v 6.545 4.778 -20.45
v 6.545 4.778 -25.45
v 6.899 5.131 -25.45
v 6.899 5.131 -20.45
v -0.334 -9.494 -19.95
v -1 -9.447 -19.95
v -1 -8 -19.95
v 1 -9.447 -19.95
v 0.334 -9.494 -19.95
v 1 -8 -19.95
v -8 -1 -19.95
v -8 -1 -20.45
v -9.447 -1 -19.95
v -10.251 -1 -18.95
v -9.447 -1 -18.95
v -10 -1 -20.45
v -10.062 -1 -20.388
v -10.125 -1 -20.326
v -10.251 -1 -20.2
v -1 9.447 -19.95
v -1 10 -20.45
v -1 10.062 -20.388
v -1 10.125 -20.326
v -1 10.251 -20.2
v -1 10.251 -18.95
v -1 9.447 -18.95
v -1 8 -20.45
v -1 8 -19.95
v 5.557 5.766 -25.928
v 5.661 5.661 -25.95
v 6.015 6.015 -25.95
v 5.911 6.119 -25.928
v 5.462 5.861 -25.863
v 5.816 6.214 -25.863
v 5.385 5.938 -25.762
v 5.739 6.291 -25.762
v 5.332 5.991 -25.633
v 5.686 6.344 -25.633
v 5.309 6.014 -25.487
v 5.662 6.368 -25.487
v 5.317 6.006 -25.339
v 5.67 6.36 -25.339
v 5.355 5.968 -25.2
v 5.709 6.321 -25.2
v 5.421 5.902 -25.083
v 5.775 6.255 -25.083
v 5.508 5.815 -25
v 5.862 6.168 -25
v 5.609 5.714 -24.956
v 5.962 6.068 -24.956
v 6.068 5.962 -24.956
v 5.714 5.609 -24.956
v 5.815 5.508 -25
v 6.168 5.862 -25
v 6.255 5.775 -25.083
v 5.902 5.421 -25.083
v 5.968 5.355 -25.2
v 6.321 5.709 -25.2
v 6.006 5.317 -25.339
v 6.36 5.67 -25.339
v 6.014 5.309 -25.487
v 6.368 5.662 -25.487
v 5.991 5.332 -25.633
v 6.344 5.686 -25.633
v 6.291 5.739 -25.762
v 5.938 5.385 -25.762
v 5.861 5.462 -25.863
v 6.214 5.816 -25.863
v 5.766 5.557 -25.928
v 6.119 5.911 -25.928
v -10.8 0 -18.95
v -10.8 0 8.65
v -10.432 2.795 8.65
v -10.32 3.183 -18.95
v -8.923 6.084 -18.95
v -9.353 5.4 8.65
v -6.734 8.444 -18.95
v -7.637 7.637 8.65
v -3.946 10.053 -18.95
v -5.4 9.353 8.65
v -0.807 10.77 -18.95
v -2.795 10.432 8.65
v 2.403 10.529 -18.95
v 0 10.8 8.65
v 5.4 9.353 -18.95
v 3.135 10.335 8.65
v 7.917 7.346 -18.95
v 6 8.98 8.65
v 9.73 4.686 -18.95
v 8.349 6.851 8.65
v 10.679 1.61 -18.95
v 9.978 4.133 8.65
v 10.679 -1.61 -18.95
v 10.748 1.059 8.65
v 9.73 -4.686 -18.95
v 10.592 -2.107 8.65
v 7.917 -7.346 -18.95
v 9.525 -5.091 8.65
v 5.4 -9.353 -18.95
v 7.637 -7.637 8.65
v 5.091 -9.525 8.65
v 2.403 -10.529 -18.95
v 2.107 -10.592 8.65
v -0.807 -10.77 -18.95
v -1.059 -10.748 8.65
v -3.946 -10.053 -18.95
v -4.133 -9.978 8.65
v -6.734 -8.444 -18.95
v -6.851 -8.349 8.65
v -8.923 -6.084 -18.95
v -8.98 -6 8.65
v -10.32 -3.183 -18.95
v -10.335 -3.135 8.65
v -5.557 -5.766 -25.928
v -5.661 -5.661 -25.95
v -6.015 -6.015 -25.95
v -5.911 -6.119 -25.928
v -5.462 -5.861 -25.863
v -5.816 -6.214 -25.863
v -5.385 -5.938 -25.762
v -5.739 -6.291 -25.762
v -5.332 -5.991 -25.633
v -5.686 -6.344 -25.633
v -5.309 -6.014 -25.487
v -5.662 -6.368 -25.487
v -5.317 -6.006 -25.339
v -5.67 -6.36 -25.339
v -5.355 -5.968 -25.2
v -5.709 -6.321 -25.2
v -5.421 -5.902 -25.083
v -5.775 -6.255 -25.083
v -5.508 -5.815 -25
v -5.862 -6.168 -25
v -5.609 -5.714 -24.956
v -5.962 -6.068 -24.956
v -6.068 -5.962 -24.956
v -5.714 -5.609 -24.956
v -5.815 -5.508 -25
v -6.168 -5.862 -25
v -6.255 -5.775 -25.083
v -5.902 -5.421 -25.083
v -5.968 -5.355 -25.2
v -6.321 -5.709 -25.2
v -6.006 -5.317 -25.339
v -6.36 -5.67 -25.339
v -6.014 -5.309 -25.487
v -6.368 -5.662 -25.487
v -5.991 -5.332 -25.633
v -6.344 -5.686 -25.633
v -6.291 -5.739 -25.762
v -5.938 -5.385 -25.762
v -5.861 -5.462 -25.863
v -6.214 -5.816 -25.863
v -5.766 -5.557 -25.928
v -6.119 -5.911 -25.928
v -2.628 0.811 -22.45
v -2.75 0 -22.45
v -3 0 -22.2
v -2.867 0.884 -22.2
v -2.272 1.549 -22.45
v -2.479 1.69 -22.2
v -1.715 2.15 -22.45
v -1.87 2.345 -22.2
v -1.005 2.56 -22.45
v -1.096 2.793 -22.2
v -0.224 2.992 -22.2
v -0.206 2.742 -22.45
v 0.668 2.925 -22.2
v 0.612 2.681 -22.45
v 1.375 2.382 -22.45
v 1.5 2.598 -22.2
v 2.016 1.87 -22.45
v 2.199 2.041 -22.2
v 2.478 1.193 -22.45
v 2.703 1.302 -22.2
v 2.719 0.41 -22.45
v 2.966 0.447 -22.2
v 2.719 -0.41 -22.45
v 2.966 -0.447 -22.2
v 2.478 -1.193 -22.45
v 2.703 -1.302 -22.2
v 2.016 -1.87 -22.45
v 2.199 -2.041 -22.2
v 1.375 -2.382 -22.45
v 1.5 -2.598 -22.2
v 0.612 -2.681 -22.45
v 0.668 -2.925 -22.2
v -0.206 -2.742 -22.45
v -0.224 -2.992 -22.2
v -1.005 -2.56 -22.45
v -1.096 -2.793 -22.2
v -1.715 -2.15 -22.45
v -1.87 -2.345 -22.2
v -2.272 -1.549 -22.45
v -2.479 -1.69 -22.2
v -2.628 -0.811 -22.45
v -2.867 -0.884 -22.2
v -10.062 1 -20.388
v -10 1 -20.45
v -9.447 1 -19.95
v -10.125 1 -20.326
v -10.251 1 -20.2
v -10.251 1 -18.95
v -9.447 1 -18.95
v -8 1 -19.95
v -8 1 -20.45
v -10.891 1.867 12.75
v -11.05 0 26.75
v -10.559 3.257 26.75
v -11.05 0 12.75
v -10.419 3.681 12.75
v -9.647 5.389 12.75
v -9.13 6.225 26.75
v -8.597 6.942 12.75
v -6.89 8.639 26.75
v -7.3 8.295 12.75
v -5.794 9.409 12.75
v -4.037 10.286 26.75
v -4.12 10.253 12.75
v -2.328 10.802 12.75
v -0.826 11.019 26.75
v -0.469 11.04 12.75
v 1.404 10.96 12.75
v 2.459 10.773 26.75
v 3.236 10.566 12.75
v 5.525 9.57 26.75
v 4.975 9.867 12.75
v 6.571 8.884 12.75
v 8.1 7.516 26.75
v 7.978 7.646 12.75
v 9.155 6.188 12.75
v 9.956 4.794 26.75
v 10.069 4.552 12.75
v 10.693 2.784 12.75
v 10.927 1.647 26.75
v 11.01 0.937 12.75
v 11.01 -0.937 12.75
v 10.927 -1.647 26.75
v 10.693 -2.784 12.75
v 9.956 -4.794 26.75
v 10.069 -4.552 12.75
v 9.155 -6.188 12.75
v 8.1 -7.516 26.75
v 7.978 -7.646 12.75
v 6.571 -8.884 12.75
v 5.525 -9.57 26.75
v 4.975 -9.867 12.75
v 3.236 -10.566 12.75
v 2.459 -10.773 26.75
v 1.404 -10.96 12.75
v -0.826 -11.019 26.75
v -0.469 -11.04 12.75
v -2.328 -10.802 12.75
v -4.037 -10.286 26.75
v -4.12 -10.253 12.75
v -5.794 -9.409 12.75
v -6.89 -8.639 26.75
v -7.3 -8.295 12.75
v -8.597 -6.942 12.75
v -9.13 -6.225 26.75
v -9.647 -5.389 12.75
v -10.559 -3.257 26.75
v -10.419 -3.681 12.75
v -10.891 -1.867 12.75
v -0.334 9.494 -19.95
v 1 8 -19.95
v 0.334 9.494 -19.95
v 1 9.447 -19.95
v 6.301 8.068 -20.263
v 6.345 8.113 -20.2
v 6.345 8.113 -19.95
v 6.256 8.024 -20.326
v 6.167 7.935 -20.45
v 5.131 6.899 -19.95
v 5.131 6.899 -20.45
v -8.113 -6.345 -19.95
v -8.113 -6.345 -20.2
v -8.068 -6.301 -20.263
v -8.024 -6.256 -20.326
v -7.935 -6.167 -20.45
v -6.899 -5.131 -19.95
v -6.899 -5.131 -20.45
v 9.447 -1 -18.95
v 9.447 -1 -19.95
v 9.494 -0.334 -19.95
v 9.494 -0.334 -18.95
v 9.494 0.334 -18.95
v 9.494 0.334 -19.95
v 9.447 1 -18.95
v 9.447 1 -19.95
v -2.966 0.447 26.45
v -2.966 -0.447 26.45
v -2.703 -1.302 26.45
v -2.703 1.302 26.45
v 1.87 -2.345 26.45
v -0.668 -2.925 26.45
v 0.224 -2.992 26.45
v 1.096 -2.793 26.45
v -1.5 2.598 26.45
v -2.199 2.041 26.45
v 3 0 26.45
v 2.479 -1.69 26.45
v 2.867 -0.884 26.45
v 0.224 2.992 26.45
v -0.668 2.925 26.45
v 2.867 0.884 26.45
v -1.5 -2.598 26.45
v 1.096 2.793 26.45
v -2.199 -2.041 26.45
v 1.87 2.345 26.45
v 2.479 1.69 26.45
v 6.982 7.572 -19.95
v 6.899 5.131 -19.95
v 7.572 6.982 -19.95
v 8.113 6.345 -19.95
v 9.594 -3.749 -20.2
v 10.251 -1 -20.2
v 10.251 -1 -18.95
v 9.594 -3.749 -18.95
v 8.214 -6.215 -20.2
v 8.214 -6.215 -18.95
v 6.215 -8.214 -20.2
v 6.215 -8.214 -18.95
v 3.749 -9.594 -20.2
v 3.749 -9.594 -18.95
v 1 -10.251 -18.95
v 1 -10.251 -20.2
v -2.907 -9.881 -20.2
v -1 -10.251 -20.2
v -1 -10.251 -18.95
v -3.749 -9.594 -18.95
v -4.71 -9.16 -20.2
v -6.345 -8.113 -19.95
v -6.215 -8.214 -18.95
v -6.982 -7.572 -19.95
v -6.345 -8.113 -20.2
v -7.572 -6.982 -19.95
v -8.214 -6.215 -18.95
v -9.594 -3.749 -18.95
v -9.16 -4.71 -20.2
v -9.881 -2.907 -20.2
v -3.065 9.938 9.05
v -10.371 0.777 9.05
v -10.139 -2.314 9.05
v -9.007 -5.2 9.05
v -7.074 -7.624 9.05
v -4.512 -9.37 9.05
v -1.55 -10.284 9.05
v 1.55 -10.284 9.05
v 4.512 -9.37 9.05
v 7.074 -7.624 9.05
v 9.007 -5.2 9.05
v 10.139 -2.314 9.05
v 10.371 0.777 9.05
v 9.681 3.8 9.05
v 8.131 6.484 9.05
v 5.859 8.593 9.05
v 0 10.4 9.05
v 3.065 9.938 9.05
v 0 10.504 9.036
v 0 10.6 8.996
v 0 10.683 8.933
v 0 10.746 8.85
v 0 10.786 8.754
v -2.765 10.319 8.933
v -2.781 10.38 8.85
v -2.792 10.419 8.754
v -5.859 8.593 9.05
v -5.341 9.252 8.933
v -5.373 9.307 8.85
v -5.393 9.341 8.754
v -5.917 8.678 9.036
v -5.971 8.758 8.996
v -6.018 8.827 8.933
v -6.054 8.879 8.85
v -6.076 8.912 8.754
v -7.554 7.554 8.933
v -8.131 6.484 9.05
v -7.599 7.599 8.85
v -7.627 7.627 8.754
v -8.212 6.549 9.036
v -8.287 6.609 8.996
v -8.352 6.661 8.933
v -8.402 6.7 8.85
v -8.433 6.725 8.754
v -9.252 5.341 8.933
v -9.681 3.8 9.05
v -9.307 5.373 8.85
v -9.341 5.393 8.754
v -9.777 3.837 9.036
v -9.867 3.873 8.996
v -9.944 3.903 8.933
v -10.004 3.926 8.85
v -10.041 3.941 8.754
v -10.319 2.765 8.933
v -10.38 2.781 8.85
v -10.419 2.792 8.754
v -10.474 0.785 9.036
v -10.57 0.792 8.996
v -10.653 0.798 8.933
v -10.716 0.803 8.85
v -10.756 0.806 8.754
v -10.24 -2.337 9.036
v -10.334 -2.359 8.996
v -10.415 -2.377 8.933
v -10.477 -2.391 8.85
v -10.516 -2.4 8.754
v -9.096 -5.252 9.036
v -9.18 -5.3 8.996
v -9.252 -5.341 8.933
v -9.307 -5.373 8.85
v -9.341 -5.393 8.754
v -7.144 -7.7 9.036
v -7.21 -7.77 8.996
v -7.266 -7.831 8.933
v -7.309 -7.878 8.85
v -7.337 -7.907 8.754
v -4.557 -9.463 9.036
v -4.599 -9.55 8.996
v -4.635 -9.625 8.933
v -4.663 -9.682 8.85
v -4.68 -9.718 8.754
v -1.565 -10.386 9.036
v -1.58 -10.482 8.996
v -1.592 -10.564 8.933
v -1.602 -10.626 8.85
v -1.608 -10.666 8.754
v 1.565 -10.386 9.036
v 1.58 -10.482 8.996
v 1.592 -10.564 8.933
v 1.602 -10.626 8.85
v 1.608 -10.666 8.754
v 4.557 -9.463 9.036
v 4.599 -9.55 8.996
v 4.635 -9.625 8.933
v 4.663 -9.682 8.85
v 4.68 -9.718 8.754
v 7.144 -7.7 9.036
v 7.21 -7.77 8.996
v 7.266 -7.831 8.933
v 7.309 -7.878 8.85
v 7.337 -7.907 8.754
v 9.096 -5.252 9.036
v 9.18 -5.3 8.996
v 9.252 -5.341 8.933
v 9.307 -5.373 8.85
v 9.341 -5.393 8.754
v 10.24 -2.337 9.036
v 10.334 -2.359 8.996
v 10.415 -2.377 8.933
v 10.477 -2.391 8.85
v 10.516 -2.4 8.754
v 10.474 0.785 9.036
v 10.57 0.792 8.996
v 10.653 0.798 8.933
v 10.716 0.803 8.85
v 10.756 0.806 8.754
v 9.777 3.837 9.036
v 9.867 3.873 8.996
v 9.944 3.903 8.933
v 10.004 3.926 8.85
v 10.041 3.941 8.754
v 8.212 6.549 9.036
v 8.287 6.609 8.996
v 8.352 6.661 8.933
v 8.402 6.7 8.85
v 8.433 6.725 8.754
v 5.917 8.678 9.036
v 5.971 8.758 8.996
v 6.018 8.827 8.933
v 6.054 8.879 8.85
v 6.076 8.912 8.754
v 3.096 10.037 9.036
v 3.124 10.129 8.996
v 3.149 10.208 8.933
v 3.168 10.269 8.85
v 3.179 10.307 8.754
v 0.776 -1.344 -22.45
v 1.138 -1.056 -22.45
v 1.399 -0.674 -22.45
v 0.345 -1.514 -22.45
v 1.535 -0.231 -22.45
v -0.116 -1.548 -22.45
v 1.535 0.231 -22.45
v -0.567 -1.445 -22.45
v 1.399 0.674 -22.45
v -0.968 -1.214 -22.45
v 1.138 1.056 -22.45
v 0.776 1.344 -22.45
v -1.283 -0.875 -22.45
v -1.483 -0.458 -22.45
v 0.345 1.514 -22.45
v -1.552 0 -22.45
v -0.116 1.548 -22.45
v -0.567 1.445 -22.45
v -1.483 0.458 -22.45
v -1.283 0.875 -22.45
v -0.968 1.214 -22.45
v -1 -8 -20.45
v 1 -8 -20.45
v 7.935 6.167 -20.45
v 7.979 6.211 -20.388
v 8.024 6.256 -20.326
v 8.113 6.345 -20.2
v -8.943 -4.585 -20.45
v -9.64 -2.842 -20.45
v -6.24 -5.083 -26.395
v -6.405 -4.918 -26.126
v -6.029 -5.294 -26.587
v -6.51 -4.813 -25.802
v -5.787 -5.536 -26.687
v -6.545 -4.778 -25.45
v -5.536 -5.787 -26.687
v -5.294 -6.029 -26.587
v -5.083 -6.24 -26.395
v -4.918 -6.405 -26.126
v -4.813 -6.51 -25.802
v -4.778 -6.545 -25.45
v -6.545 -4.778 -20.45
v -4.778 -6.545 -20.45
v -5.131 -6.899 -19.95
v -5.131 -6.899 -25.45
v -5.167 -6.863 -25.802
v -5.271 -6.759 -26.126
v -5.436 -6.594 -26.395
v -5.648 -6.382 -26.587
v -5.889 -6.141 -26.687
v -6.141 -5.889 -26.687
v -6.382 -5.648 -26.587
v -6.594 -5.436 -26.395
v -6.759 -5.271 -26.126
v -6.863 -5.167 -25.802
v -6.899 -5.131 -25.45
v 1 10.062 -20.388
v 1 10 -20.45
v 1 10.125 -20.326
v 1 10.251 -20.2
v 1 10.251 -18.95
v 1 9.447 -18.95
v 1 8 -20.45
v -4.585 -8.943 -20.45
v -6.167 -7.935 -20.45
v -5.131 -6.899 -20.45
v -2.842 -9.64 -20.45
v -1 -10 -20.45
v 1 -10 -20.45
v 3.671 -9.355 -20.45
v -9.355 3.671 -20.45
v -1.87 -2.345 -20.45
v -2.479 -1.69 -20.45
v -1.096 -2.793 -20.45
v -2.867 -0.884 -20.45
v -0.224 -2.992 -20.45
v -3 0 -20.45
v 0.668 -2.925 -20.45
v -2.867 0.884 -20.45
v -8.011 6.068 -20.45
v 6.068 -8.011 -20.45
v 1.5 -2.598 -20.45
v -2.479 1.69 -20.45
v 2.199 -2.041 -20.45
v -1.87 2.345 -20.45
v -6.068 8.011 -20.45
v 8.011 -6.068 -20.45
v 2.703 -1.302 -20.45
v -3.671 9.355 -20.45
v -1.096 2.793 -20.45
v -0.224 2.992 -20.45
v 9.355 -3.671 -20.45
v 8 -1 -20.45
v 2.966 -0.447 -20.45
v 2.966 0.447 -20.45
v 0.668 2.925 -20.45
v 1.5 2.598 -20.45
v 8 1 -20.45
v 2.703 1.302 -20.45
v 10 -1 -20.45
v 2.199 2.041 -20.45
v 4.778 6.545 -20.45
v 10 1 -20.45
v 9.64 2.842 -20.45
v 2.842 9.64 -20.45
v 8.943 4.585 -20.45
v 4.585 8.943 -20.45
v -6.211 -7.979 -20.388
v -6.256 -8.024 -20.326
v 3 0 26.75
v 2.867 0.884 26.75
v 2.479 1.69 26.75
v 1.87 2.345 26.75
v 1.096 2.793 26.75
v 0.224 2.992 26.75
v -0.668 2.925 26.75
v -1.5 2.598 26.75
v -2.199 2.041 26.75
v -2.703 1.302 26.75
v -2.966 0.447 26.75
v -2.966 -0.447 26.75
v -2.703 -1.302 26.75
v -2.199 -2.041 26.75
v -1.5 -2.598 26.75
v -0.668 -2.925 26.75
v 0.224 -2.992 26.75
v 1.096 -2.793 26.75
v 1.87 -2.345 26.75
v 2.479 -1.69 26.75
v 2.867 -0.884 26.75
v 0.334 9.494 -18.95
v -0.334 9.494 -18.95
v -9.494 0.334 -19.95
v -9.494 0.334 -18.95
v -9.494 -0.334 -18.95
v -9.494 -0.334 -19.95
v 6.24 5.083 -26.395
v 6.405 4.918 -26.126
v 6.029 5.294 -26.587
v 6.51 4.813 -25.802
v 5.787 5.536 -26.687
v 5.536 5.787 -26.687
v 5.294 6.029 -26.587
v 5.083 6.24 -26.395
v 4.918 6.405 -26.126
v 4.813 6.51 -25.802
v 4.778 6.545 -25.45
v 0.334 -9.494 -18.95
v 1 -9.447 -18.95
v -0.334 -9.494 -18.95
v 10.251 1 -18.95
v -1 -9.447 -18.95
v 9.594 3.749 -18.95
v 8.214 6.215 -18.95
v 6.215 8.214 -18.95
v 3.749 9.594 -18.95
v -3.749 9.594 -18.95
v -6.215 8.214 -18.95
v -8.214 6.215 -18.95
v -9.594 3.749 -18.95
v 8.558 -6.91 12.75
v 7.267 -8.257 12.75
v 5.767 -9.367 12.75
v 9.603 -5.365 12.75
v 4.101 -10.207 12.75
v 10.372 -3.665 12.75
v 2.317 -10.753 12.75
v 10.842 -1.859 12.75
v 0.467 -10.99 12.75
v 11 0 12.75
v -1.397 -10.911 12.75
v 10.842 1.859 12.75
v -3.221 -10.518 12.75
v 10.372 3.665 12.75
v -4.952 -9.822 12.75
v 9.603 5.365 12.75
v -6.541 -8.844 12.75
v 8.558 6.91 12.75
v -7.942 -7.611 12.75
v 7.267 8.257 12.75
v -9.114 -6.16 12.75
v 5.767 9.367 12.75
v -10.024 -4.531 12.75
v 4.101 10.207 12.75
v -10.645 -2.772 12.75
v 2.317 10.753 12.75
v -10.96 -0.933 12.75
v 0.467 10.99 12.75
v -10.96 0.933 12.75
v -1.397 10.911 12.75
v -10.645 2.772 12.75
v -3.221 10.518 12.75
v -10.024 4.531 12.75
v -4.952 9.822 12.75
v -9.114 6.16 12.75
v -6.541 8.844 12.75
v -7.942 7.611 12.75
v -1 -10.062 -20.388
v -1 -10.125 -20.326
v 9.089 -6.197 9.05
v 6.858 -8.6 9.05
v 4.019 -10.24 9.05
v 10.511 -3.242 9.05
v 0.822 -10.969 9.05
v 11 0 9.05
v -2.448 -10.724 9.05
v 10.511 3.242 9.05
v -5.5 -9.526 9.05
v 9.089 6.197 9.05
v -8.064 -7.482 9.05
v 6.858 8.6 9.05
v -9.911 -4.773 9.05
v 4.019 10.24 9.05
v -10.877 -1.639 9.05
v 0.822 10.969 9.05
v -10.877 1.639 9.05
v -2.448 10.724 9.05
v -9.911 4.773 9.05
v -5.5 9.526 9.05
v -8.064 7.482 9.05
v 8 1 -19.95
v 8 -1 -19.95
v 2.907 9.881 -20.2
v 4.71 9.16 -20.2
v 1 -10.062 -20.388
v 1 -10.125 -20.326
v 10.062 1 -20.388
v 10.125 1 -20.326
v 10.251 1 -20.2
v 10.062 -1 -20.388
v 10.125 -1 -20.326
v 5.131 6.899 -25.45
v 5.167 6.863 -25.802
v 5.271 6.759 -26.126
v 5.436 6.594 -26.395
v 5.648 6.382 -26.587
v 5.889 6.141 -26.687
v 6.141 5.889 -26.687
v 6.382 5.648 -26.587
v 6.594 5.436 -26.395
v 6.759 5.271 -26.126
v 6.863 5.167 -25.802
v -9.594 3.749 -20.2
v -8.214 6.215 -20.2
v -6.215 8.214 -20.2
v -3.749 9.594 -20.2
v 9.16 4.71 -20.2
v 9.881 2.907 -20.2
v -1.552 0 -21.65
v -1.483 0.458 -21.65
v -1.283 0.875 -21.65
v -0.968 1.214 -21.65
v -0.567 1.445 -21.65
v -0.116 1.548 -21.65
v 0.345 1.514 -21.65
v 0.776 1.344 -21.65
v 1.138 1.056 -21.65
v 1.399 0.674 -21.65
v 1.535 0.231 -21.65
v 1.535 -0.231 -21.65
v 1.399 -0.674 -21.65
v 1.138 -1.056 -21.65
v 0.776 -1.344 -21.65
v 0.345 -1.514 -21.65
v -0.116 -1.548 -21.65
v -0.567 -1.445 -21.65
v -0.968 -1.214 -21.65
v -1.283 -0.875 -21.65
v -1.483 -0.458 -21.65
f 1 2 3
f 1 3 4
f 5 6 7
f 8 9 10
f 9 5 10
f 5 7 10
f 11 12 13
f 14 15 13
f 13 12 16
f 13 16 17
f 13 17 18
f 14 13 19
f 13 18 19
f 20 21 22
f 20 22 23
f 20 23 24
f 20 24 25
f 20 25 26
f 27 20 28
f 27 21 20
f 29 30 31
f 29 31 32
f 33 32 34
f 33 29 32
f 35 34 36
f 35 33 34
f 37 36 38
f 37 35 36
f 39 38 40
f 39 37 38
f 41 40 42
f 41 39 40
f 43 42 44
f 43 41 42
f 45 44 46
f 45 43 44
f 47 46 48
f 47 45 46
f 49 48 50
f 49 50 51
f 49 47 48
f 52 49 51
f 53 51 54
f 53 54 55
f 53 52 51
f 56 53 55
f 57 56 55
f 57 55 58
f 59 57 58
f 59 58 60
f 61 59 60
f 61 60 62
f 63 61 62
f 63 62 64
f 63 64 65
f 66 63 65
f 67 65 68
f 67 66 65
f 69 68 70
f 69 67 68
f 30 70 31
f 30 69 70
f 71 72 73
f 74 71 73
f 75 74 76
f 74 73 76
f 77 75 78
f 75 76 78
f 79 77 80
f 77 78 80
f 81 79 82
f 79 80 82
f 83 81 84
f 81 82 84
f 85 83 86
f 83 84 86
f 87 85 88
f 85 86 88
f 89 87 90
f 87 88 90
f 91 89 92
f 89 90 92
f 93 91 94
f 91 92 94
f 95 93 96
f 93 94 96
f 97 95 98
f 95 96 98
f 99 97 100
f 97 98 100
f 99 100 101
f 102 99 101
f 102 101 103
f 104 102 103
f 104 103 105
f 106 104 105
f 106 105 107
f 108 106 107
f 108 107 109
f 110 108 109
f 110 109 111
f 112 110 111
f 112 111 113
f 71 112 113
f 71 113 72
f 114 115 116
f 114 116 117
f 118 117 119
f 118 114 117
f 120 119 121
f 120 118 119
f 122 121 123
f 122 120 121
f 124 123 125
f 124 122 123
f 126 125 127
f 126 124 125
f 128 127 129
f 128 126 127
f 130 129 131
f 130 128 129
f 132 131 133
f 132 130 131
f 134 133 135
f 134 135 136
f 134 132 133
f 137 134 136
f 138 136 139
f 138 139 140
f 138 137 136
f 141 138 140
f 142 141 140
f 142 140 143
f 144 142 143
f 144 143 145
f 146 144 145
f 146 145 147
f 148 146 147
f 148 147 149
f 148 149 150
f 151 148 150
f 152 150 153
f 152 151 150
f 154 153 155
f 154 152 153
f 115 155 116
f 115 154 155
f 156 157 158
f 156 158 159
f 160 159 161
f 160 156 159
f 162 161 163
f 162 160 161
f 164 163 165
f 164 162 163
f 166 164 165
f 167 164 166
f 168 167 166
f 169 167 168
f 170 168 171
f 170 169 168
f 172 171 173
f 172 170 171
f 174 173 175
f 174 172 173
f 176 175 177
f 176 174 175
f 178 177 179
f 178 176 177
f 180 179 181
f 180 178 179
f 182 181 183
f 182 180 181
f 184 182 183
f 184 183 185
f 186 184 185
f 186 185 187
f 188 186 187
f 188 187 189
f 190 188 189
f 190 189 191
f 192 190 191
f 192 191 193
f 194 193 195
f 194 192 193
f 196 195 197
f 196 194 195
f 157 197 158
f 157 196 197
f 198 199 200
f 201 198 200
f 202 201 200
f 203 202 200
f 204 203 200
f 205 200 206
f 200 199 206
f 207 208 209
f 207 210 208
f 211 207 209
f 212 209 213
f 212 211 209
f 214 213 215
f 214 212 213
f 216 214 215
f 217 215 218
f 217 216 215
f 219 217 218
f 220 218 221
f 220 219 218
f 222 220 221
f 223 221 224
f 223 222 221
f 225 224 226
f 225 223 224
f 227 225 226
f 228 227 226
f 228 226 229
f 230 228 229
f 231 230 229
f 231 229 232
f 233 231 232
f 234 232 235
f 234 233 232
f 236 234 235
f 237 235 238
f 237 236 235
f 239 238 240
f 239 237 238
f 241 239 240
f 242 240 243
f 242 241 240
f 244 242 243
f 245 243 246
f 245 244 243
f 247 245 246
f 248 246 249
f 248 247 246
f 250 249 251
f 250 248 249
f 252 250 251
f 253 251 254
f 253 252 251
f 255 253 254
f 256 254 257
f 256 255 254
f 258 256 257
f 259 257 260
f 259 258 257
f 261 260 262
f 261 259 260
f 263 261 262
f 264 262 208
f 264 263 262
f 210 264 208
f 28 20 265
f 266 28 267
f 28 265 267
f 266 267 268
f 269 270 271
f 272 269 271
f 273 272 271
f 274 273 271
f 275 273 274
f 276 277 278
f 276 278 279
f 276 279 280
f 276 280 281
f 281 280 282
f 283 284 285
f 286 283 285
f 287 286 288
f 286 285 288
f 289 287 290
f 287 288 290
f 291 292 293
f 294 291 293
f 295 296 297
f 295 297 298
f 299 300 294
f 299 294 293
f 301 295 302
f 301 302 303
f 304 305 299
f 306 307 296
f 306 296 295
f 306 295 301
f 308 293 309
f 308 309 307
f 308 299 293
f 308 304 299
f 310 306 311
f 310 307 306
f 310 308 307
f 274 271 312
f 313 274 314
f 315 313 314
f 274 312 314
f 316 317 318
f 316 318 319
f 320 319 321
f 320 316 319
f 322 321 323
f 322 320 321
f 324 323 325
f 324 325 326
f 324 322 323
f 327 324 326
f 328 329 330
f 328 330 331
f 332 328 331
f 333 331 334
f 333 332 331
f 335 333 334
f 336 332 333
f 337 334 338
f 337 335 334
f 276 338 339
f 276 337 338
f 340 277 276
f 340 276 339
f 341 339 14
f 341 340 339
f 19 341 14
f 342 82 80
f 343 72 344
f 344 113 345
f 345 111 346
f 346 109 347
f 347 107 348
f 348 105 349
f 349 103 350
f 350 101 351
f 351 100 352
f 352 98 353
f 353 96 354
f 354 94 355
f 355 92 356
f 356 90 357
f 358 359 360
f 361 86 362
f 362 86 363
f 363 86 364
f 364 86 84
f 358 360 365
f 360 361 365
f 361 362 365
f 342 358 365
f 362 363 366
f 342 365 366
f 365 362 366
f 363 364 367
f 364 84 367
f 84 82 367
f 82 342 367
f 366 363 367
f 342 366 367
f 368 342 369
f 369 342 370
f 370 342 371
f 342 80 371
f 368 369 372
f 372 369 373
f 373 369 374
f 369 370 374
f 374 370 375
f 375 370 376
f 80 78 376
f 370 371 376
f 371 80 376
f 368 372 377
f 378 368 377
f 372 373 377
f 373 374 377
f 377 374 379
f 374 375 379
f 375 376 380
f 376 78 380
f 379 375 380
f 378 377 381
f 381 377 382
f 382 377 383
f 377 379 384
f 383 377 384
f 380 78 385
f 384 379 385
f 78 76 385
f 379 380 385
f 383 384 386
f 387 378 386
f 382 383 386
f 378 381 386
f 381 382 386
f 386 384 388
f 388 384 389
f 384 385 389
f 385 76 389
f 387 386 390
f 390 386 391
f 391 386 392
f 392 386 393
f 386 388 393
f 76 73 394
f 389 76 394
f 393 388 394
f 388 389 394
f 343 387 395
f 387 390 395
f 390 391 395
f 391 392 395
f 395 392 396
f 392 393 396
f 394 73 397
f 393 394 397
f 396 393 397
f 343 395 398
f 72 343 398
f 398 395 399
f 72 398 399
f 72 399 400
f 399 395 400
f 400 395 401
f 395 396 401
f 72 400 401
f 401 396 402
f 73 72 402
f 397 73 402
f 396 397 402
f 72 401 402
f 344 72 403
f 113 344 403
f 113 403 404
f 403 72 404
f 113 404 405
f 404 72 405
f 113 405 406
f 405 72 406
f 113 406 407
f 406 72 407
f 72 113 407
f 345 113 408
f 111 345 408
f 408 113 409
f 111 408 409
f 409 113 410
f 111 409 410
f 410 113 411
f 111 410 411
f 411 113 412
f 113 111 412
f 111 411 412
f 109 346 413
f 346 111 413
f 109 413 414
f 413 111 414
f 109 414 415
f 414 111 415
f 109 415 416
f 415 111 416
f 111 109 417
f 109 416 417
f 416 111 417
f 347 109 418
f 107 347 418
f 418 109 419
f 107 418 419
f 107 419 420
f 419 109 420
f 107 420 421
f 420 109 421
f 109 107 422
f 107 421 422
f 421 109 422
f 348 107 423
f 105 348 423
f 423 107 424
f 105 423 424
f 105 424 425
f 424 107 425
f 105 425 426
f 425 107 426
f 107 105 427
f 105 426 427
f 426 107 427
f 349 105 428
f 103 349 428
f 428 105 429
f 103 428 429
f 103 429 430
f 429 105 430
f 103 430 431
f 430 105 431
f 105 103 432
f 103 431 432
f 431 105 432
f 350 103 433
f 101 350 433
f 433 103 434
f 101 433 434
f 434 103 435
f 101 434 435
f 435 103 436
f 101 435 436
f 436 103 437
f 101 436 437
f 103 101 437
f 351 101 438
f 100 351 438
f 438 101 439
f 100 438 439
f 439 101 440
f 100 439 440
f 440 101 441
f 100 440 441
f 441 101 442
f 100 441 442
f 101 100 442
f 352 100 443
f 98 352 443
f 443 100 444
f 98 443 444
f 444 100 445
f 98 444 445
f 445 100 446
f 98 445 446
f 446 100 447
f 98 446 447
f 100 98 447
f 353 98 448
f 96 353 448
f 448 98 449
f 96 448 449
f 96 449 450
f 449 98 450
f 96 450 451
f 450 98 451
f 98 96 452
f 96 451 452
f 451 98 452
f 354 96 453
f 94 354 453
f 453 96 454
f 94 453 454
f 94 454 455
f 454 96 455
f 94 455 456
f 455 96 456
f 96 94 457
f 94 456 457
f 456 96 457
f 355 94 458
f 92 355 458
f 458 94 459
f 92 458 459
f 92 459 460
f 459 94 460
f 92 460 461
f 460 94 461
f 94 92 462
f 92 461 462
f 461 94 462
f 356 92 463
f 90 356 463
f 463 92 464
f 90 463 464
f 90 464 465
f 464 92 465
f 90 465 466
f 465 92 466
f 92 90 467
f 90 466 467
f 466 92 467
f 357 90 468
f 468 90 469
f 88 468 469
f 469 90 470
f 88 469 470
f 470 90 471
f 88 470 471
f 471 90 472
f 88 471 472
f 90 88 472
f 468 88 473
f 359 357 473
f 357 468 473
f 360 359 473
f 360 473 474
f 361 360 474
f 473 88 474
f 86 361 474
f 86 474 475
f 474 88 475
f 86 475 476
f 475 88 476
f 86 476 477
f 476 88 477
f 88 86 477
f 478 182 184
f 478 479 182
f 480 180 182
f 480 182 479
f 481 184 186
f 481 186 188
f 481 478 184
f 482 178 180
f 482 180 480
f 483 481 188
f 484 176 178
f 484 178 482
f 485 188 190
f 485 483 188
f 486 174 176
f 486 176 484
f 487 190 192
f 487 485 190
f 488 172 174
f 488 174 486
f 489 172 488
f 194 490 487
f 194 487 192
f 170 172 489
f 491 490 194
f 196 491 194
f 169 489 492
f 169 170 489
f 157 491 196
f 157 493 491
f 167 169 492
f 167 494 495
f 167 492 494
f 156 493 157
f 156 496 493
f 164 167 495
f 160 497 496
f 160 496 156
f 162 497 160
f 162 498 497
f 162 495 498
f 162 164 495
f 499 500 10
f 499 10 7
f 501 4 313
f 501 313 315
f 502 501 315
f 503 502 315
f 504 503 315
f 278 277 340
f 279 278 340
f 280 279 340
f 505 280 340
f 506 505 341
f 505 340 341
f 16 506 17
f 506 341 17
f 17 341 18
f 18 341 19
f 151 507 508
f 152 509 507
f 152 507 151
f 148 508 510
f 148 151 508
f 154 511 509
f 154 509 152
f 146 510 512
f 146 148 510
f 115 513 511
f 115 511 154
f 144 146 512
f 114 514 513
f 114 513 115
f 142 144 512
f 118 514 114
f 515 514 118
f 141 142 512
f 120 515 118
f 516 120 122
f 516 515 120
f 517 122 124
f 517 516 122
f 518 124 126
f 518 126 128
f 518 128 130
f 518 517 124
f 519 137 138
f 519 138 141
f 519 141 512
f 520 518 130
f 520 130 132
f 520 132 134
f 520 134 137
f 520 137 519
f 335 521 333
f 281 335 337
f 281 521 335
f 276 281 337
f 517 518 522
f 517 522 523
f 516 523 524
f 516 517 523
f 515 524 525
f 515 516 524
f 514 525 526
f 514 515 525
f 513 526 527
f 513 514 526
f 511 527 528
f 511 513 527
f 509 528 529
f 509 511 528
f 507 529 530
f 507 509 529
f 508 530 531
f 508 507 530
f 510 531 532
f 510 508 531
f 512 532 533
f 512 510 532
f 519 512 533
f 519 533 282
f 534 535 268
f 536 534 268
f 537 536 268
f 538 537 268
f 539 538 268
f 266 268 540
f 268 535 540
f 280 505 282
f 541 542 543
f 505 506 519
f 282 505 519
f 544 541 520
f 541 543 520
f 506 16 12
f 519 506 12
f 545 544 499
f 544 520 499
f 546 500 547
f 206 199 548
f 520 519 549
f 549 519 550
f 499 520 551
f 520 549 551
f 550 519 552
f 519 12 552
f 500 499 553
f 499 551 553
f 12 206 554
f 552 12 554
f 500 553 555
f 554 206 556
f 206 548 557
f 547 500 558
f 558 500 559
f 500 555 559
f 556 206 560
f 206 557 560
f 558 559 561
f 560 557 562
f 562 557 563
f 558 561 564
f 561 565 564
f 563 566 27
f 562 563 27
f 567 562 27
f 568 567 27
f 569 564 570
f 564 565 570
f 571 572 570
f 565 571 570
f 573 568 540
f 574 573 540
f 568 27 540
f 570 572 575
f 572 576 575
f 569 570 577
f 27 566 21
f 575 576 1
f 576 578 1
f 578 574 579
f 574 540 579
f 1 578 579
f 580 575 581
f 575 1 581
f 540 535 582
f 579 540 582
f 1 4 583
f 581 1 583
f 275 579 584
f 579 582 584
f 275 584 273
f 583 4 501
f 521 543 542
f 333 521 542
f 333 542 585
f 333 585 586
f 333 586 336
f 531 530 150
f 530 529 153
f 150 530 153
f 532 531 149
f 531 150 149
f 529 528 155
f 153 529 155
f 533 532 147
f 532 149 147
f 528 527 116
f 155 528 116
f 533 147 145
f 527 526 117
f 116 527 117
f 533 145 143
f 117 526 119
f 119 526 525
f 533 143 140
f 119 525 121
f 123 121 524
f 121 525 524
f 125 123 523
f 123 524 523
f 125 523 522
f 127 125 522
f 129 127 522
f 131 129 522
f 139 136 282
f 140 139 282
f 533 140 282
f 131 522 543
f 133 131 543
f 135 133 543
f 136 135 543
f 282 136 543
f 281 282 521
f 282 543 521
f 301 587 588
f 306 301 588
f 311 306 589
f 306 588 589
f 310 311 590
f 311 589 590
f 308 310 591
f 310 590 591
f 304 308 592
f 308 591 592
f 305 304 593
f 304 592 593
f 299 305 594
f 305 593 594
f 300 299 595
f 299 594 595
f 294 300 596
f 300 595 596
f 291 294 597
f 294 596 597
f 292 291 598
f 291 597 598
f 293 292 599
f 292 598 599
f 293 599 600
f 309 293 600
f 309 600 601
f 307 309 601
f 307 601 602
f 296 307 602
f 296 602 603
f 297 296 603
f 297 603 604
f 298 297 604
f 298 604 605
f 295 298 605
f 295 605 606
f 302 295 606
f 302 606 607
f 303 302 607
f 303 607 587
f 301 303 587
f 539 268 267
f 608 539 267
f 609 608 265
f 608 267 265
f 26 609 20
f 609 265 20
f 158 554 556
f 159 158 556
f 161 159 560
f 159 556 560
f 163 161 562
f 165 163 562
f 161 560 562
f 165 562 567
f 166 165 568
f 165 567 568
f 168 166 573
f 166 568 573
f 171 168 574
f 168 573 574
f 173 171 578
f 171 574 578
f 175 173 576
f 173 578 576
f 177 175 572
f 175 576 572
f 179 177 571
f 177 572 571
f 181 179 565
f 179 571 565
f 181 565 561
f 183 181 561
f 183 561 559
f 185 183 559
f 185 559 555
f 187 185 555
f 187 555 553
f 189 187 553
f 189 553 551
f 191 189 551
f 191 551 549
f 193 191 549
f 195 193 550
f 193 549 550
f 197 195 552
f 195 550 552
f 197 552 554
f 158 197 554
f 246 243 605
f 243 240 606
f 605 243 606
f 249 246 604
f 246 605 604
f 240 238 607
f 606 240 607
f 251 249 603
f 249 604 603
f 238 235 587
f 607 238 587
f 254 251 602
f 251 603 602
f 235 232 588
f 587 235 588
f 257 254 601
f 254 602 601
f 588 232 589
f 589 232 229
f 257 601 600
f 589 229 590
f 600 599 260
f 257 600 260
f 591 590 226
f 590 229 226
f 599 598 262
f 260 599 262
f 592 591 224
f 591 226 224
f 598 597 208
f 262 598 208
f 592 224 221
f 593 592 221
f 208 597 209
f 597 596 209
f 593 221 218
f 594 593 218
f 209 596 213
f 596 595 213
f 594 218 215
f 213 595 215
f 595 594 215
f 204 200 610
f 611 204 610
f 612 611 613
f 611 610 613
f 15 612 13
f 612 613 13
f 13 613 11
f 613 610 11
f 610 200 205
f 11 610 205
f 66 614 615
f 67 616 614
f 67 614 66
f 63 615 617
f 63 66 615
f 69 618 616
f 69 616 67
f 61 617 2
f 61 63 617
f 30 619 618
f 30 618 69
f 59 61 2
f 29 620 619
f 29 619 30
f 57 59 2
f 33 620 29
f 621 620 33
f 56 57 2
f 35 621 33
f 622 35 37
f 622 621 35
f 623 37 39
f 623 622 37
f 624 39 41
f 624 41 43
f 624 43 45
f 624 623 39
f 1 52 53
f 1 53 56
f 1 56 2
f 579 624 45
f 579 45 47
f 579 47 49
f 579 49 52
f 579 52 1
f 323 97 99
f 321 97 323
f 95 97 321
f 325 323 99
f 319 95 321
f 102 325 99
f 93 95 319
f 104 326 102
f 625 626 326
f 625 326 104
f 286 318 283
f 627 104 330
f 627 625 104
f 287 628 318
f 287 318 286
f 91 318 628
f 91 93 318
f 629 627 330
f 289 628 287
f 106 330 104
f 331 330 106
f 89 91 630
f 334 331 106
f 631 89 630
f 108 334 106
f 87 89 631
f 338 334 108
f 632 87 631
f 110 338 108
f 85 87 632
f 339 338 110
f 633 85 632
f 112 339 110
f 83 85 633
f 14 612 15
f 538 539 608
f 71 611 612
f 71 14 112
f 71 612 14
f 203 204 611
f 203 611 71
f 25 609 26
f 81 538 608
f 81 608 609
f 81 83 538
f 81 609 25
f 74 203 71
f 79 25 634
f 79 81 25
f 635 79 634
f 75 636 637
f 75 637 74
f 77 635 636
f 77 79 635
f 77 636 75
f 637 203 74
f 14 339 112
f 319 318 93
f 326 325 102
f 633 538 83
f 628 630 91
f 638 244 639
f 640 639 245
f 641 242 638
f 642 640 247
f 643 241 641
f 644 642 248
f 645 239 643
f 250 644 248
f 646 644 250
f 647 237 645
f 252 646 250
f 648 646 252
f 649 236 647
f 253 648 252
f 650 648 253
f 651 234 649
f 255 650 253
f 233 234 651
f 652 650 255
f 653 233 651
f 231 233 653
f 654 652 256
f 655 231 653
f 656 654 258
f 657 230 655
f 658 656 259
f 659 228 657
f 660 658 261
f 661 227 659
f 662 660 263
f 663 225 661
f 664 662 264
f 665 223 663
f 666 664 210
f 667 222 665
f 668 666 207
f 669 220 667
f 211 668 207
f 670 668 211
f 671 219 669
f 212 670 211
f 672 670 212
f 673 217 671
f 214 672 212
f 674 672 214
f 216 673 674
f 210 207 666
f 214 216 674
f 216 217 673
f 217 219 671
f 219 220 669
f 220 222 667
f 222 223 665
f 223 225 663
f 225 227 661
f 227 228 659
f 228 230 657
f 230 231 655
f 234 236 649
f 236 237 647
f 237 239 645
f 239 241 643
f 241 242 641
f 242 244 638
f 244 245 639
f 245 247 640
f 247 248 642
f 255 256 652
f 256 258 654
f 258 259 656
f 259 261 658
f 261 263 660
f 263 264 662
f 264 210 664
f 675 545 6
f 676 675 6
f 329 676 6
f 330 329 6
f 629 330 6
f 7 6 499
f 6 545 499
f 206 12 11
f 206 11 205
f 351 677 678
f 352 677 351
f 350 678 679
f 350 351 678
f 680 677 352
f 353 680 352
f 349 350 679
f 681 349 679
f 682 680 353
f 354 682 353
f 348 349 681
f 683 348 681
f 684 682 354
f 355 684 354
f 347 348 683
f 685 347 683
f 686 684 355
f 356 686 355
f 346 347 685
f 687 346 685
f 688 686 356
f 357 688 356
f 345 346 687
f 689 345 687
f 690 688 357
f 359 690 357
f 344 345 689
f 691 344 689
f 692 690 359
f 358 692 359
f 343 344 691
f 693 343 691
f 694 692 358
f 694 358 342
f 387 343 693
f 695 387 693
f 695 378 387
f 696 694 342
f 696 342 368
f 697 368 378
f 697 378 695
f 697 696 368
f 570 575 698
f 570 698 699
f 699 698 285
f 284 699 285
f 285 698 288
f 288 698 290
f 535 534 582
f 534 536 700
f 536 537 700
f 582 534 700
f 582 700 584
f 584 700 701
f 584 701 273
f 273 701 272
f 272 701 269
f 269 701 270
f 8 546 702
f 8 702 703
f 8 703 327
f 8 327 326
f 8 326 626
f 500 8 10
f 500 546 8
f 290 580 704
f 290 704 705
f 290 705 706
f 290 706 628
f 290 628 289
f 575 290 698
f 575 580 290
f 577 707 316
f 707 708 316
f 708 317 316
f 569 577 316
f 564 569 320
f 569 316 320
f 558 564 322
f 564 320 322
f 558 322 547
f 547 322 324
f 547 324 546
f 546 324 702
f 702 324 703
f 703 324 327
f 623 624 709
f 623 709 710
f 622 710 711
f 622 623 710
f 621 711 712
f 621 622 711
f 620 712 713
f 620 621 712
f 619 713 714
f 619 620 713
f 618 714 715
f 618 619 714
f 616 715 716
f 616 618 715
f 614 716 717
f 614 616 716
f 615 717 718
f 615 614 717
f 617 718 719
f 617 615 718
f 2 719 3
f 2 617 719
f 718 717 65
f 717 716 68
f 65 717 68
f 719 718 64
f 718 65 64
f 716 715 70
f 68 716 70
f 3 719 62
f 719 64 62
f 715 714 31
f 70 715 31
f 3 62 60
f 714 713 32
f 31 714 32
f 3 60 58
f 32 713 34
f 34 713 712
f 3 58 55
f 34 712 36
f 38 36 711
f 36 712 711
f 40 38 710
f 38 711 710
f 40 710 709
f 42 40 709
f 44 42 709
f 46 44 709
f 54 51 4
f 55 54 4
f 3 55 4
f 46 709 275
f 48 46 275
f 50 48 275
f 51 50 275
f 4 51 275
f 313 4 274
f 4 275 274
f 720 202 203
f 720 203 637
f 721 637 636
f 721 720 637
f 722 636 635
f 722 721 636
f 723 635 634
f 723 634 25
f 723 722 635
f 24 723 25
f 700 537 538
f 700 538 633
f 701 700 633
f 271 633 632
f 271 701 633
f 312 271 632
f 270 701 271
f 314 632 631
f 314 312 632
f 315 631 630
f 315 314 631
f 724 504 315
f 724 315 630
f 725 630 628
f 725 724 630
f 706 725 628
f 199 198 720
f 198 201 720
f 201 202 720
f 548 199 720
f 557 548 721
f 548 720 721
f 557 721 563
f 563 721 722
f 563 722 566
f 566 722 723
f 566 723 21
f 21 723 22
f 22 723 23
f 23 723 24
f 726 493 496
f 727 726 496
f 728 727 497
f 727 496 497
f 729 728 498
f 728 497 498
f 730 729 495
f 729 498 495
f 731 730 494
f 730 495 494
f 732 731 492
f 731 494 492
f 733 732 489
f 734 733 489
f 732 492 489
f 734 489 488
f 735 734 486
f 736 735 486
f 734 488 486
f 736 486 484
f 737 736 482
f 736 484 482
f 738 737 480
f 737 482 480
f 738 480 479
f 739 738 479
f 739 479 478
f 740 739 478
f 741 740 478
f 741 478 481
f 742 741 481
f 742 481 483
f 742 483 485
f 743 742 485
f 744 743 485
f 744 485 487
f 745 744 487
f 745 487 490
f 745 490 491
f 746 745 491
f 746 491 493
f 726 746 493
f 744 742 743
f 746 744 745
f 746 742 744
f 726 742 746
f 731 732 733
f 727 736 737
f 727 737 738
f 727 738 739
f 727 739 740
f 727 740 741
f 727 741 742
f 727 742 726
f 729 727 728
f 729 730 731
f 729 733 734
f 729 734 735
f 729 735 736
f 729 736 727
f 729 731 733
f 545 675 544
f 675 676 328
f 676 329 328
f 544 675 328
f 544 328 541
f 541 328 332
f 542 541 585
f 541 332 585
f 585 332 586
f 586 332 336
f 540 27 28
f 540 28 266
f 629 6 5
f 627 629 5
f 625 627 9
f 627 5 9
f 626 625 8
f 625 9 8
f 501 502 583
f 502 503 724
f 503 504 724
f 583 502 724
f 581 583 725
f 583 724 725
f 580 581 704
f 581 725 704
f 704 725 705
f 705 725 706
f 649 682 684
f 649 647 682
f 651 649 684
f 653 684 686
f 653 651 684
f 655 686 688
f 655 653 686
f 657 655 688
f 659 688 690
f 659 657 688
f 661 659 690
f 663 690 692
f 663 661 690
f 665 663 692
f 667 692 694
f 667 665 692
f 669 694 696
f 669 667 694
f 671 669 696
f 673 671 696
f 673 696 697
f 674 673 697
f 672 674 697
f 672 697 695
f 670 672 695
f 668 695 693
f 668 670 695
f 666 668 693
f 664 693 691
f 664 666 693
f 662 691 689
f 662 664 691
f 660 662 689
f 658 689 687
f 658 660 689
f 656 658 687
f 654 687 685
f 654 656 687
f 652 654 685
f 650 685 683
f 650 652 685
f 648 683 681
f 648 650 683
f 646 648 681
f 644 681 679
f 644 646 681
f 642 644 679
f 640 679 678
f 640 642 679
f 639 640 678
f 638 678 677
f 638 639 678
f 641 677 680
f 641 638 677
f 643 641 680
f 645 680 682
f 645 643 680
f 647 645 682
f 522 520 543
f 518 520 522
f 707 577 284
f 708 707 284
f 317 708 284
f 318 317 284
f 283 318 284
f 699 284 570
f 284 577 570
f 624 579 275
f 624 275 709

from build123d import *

# Parameters (mm, degrees)
SKETCH1_R           = 11
BOSS_EXTRUDE1_DEPTH = 20.45
SKETCH2_R           = 11
SKETCH2_R_2         = 10.8
CUT_EXTRUDE1_DEPTH  = 30.5
SKETCH5_R           = 0.8
CUT_EXTRUDE2_DEPTH  = 3
BOSS_EXTRUDE2_DEPTH = 2
SKETCH7_R           = 3
BOSS_EXTRUDE3_DEPTH = 12
CUT_EXTRUDE3_DEPTH  = 1
CIRPATTERN1_COUNT   = 4
CIRPATTERN2_COUNT   = 4
SKETCH11_R          = 5
BOSS_EXTRUDE4_DEPTH = 0.25
SKETCH12_R          = 11.05
BOSS_EXTRUDE5_DEPTH = 7
SKETCH14_R          = 1.0375
CUT_EXTRUDE4_DEPTH  = 3
SKETCH16_R          = 10.8
SKETCH16_R_2        = 10.3
CUT_EXTRUDE5_DEPTH  = 1.5
CUT_EXTRUDE6_DEPTH  = 0.5
CUT_EXTRUDE7_DEPTH  = 1.5
CHAMFER1_SIZE       = 0.25
CUT_EXTRUDE8_DEPTH  = 0.5
SKETCH20_R          = 0.5
BOSS_EXTRUDE7_DEPTH = 0.5
CIRPATTERN4_COUNT   = 2
SKETCH22_R          = 3
BOSS_EXTRUDE8_DEPTH = 2
SKETCH23_R          = 1
BOSS_EXTRUDE9_DEPTH = 9.2
CHAMFER2_SIZE       = 0.25
SKETCH24_R          = 1.552462654
CUT_EXTRUDE9_DEPTH  = 10
SKETCH25_R          = 3
CUT_EXTRUDE10_DEPTH = 8


with BuildPart() as part:
    # Sketch1 → Boss-Extrude1 (new body, symmetric)
    with BuildSketch(Plane.XY):
        Circle(SKETCH1_R)
    extrude(amount=BOSS_EXTRUDE1_DEPTH, both=True)

    # Sketch2 → Cut-Extrude1 (cut, through all)
    with BuildSketch(Plane(origin=(0, 0, 9.05), x_dir=(-1, 0, 0), z_dir=(0, 0, -1))):
        Circle(SKETCH2_R)
        Circle(SKETCH2_R_2, mode=Mode.SUBTRACT)
    extrude(amount=CUT_EXTRUDE1_DEPTH, mode=Mode.SUBTRACT)

    # Sketch5 → Cut-Extrude2 (cut)
    with BuildSketch(Plane.XY.offset(20.45)):
        with Locations((-6.363961031, 6.363961031)):
            Circle(SKETCH5_R)
        with Locations((6.363961031, 6.363961031)):
            Circle(SKETCH5_R)
        with Locations((6.363961031, -6.363961031)):
            Circle(SKETCH5_R)
        with Locations((-6.363961031, -6.363961031)):
            Circle(SKETCH5_R)
        with BuildLine():
            Line((-1.5, 9), (-1.5, 10.897247359))
            ThreePointArc((-1.5, 10.897247359), (0, 11), (1.5, 10.897247359))
            Line((1.5, 10.897247359), (1.5, 9))
            ThreePointArc((1.5, 9), (0, 7.5), (-1.5, 9))
        make_face()
        with BuildLine():
            Line((9, 1.5), (10.897247359, 1.5))
            ThreePointArc((10.897247359, 1.5), (11, 0), (10.897247359, -1.5))
            Line((10.897247359, -1.5), (9, -1.5))
            ThreePointArc((9, -1.5), (7.5, 0), (9, 1.5))
        make_face()
        with BuildLine():
            Line((1.5, -9), (1.5, -10.897247359))
            ThreePointArc((1.5, -10.897247359), (0, -11), (-1.5, -10.897247359))
            Line((-1.5, -10.897247359), (-1.5, -9))
            ThreePointArc((-1.5, -9), (0, -7.5), (1.5, -9))
        make_face()
        with BuildLine():
            Line((-9, -1.5), (-10.897247359, -1.5))
            ThreePointArc((-10.897247359, -1.5), (-11, 0), (-10.897247359, 1.5))
            Line((-10.897247359, 1.5), (-9, 1.5))
            ThreePointArc((-9, 1.5), (-7.5, 0), (-9, -1.5))
        make_face()
    extrude(amount=-CUT_EXTRUDE2_DEPTH, mode=Mode.SUBTRACT)

    # Sketch3 → Cut-Revolve3 (revolve, cut)
    with BuildSketch(Plane(origin=(0, 0, 0), x_dir=(0, 0, -1), z_dir=(1, 0, 0))):
        with BuildLine():
            ThreePointArc((-9.05, 10.4), (-8.932842712, 10.682842712), (-8.65, 10.8))
            Line((-8.65, 10.8), (-9.05, 10.8))
            Line((-9.05, 10.8), (-9.05, 10.4))
        make_face()
    revolve(axis=Axis((0, 0, -27.758521673), (0, 0, 1)), mode=Mode.SUBTRACT)

    # Sketch6 → Boss-Extrude2 (add)
    with BuildSketch(Plane.XY.offset(20.45)):
        with BuildLine():
            Line((-6, -3.605551275), (-6, 3.605551275))
            ThreePointArc((-6, 3.605551275), (0, 7), (6, 3.605551275))
            Line((6, 3.605551275), (6, -3.605551275))
            ThreePointArc((6, -3.605551275), (0, -7), (-6, -3.605551275))
        make_face()
    extrude(amount=BOSS_EXTRUDE2_DEPTH)

    # Sketch7 → Boss-Extrude3 (add)
    with BuildSketch(Plane.XY.offset(22.45)):
        Circle(SKETCH7_R)
    extrude(amount=BOSS_EXTRUDE3_DEPTH)

    # Sketch9 → Revolve1 (revolve)
    with BuildSketch(Plane(origin=(0, 9, 0), x_dir=(1, 0, 0), z_dir=(0, 1, 0))):
        with BuildLine():
            Line((0, -17.45), (0, -18.65))
            Line((0, -18.65), (0.85, -18.65))
            ThreePointArc((0.85, -18.65), (1.168198052, -18.518198052), (1.3, -18.2))
            Line((1.3, -18.2), (1.3, -17.45))
            Line((1.3, -17.45), (0, -17.45))
        make_face()
    revolve1 = revolve(axis=Axis((0, 9, 17.45), (0, 0, 1)))

    # Sketch10 → Cut-Extrude3 (cut)
    with BuildSketch(Plane.XY.offset(18.65)):
        with BuildLine():
            Line((0.15, 9.15), (1.291317157, 9.15))
            ThreePointArc((1.291317157, 9.15), (1.3, 9), (1.291317157, 8.85))
            Line((1.291317157, 8.85), (0.15, 8.85))
            Line((0.15, 8.85), (-0.15, 8.85))
            Line((-0.15, 8.85), (-1.291317157, 8.85))
            ThreePointArc((-1.291317157, 8.85), (-1.3, 9), (-1.291317157, 9.15))
            Line((-1.291317157, 9.15), (-0.15, 9.15))
            Line((-0.15, 9.15), (0.15, 9.15))
        make_face()
    cut_extrude3 = extrude(amount=-CUT_EXTRUDE3_DEPTH, mode=Mode.SUBTRACT)

    # CirPattern1: Revolve1 ×4 about axis
    cirpattern1_axis = Axis((0, 0, 0), (0, 0, 1))
    for i in range(1, CIRPATTERN1_COUNT):
        add(revolve1.rotate(cirpattern1_axis, i * 360 / CIRPATTERN1_COUNT))

    # CirPattern2: Cut-Extrude3 ×4 about axis
    cirpattern2_axis = Axis((0, 0, -27.758521673), (0, 0, 1))
    for i in range(1, CIRPATTERN2_COUNT):
        add(cut_extrude3.rotate(cirpattern2_axis, i * 360 / CIRPATTERN2_COUNT), mode=Mode.SUBTRACT)

    # Sketch11 → Boss-Extrude4 (add)
    with BuildSketch(Plane.XY.offset(22.45)):
        Circle(SKETCH11_R)
    extrude(amount=BOSS_EXTRUDE4_DEPTH)

    # Sketch12 → Boss-Extrude5 (add, symmetric)
    with BuildSketch(Plane(origin=(0, 0, 19.75), x_dir=(-1, 0, 0), z_dir=(0, 0, -1))):
        Circle(SKETCH12_R)
    extrude(amount=BOSS_EXTRUDE5_DEPTH, both=True)

    # Sketch14 → Cut-Extrude4 (cut, symmetric)
    with BuildSketch(Plane(origin=(0, 0, 0), x_dir=(0, 0, -1), z_dir=(1, 0, 0))):
        with Locations((-30.35, 0)):
            Circle(SKETCH14_R)
    extrude(amount=CUT_EXTRUDE4_DEPTH, both=True, mode=Mode.SUBTRACT)

    # Sketch16 → Cut-Extrude5 (cut)
    with BuildSketch(Plane(origin=(0, 0, -20.45), x_dir=(-1, 0, 0), z_dir=(0, 0, -1))):
        Circle(SKETCH16_R)
        Circle(SKETCH16_R_2, mode=Mode.SUBTRACT)
    extrude(amount=-CUT_EXTRUDE5_DEPTH, mode=Mode.SUBTRACT)

    # Sketch17 → Cut-Extrude6 (cut)
    with BuildSketch(Plane(origin=(0, 0, -20.45), x_dir=(-1, 0, 0), z_dir=(0, 0, -1))):
        with BuildLine():
            Line((0, 8), (-1, 8))
            Line((-1, 8), (-1, 10.251341376))
            ThreePointArc((-1, 10.251341376), (0, 10.3), (1, 10.251341376))
            Line((1, 10.251341376), (1, 8))
            Line((1, 8), (0, 8))
        make_face()
        with BuildLine():
            Line((8, 1), (10.251341376, 1))
            ThreePointArc((10.251341376, 1), (10.3, 0), (10.251341376, -1))
            Line((10.251341376, -1), (8, -1))
            Line((8, -1), (8, 0))
            Line((8, 0), (8, 1))
        make_face()
        with BuildLine():
            Line((1, -8), (1, -10.251341376))
            ThreePointArc((1, -10.251341376), (0, -10.3), (-1, -10.251341376))
            Line((-1, -10.251341376), (-1, -8))
            Line((-1, -8), (0, -8))
            Line((0, -8), (1, -8))
        make_face()
        with BuildLine():
            Line((-8, -1), (-10.251341376, -1))
            ThreePointArc((-10.251341376, -1), (-10.3, 0), (-10.251341376, 1))
            Line((-10.251341376, 1), (-8, 1))
            Line((-8, 1), (-8, 0))
            Line((-8, 0), (-8, -1))
        make_face()
    extrude(amount=-CUT_EXTRUDE6_DEPTH, mode=Mode.SUBTRACT)

    # Sketch18 → Cut-Extrude7 (cut)
    with BuildSketch(Plane(origin=(0, 0, -20.45), x_dir=(-1, 0, 0), z_dir=(0, 0, -1))):
        with BuildLine():
            Line((-1, 10.251341376), (-1, 9.447221814))
            ThreePointArc((-1, 9.447221814), (0, 9.5), (1, 9.447221814))
            Line((1, 9.447221814), (1, 10.251341376))
            ThreePointArc((1, 10.251341376), (0, 10.3), (-1, 10.251341376))
        make_face()
        with BuildLine():
            Line((10.251341376, 1), (9.447221814, 1))
            ThreePointArc((9.447221814, 1), (9.5, 0), (9.447221814, -1))
            Line((9.447221814, -1), (10.251341376, -1))
            ThreePointArc((10.251341376, -1), (10.3, 0), (10.251341376, 1))
        make_face()
        with BuildLine():
            Line((1, -10.251341376), (1, -9.447221814))
            ThreePointArc((1, -9.447221814), (0, -9.5), (-1, -9.447221814))
            Line((-1, -9.447221814), (-1, -10.251341376))
            ThreePointArc((-1, -10.251341376), (0, -10.3), (1, -10.251341376))
        make_face()
        with BuildLine():
            Line((-10.251341376, -1), (-9.447221814, -1))
            ThreePointArc((-9.447221814, -1), (-9.5, 0), (-9.447221814, 1))
            Line((-9.447221814, 1), (-10.251341376, 1))
            ThreePointArc((-10.251341376, 1), (-10.3, 0), (-10.251341376, -1))
        make_face()
    extrude(amount=-CUT_EXTRUDE7_DEPTH, mode=Mode.SUBTRACT)

    # Chamfer1
    chamfer1_edges = [part.edges().sort_by_distance(p)[0] for p in [
        (-7.283199846, 7.283199846, -20.45),
        (7.283199846, 7.283199846, -20.45),
        (7.283199846, -7.283199846, -20.45),
        (-7.283199846, -7.283199846, -20.45),
    ]]
    chamfer(chamfer1_edges, length=CHAMFER1_SIZE)

    # Sketch19 → Cut-Extrude8 (cut)
    with BuildSketch(Plane(origin=(0, 0, -20.45), x_dir=(-1, 0, 0), z_dir=(0, 0, -1))):
        with BuildLine():
            Line((-6.545347941, 4.777580988), (-8.313114894, 6.545347941))
            ThreePointArc((-8.313114894, 6.545347941), (-7.481626123, 7.481626123), (-6.545347941, 8.313114894))
            Line((-6.545347941, 8.313114894), (-4.777580988, 6.545347941))
            Line((-4.777580988, 6.545347941), (-6.545347941, 4.777580988))
        make_face()
        with BuildLine():
            Line((4.777580988, -6.545347941), (6.545347941, -8.313114894))
            ThreePointArc((6.545347941, -8.313114894), (7.481626123, -7.481626123), (8.313114894, -6.545347941))
            Line((8.313114894, -6.545347941), (6.545347941, -4.777580988))
            Line((6.545347941, -4.777580988), (4.777580988, -6.545347941))
        make_face()
    extrude(amount=-CUT_EXTRUDE8_DEPTH, mode=Mode.SUBTRACT)

    # Sketch20 → Boss-Extrude7 (add)
    with BuildSketch(Plane(origin=(5.661464464, 5.661464464, 0), x_dir=(0, 0, -1), z_dir=(0.707106781, 0.707106781, 0))):
        with BuildLine():
            Line((19.95, 1.25), (25.45, 1.25))
            ThreePointArc((25.45, 1.25), (26.7, 0), (25.45, -1.25))
            Line((25.45, -1.25), (19.95, -1.25))
            Line((19.95, -1.25), (19.95, 1.25))
        make_face()
        with Locations((25.45, 0)):
            Circle(SKETCH20_R, mode=Mode.SUBTRACT)
    boss_extrude7 = extrude(amount=BOSS_EXTRUDE7_DEPTH)

    # CirPattern4: Boss-Extrude7 ×2 about axis
    cirpattern4_axis = Axis((0, 0, 0), (0, 0, 1))
    for i in range(1, CIRPATTERN4_COUNT):
        add(boss_extrude7.rotate(cirpattern4_axis, i * 360 / CIRPATTERN4_COUNT))

    # Sketch22 → Boss-Extrude8 (add)
    with BuildSketch(Plane(origin=(0, 0, -20.45), x_dir=(-1, 0, 0), z_dir=(0, 0, -1))):
        Circle(SKETCH22_R)
    extrude(amount=BOSS_EXTRUDE8_DEPTH)

    # Sketch23 → Boss-Extrude9 (add)
    with BuildSketch(Plane(origin=(0, 0, -22.45), x_dir=(-1, 0, 0), z_dir=(0, 0, -1))):
        Circle(SKETCH23_R)
    extrude(amount=BOSS_EXTRUDE9_DEPTH)

    # Chamfer2
    chamfer2_edges = [part.edges().sort_by_distance(p)[0] for p in [
        (3, 0, -22.45),
    ]]
    chamfer(chamfer2_edges, length=CHAMFER2_SIZE)

    # Sketch24 → Cut-Extrude9 (cut)
    with BuildSketch(Plane(origin=(0, 0, -31.65), x_dir=(-1, 0, 0), z_dir=(0, 0, -1))):
        Circle(SKETCH24_R)
    extrude(amount=-CUT_EXTRUDE9_DEPTH, mode=Mode.SUBTRACT)

    # Sketch25 → Cut-Extrude10 (cut)
    with BuildSketch(Plane.XY.offset(34.45)):
        Circle(SKETCH25_R)
    extrude(amount=-CUT_EXTRUDE10_DEPTH, mode=Mode.SUBTRACT)


solid = part.part
